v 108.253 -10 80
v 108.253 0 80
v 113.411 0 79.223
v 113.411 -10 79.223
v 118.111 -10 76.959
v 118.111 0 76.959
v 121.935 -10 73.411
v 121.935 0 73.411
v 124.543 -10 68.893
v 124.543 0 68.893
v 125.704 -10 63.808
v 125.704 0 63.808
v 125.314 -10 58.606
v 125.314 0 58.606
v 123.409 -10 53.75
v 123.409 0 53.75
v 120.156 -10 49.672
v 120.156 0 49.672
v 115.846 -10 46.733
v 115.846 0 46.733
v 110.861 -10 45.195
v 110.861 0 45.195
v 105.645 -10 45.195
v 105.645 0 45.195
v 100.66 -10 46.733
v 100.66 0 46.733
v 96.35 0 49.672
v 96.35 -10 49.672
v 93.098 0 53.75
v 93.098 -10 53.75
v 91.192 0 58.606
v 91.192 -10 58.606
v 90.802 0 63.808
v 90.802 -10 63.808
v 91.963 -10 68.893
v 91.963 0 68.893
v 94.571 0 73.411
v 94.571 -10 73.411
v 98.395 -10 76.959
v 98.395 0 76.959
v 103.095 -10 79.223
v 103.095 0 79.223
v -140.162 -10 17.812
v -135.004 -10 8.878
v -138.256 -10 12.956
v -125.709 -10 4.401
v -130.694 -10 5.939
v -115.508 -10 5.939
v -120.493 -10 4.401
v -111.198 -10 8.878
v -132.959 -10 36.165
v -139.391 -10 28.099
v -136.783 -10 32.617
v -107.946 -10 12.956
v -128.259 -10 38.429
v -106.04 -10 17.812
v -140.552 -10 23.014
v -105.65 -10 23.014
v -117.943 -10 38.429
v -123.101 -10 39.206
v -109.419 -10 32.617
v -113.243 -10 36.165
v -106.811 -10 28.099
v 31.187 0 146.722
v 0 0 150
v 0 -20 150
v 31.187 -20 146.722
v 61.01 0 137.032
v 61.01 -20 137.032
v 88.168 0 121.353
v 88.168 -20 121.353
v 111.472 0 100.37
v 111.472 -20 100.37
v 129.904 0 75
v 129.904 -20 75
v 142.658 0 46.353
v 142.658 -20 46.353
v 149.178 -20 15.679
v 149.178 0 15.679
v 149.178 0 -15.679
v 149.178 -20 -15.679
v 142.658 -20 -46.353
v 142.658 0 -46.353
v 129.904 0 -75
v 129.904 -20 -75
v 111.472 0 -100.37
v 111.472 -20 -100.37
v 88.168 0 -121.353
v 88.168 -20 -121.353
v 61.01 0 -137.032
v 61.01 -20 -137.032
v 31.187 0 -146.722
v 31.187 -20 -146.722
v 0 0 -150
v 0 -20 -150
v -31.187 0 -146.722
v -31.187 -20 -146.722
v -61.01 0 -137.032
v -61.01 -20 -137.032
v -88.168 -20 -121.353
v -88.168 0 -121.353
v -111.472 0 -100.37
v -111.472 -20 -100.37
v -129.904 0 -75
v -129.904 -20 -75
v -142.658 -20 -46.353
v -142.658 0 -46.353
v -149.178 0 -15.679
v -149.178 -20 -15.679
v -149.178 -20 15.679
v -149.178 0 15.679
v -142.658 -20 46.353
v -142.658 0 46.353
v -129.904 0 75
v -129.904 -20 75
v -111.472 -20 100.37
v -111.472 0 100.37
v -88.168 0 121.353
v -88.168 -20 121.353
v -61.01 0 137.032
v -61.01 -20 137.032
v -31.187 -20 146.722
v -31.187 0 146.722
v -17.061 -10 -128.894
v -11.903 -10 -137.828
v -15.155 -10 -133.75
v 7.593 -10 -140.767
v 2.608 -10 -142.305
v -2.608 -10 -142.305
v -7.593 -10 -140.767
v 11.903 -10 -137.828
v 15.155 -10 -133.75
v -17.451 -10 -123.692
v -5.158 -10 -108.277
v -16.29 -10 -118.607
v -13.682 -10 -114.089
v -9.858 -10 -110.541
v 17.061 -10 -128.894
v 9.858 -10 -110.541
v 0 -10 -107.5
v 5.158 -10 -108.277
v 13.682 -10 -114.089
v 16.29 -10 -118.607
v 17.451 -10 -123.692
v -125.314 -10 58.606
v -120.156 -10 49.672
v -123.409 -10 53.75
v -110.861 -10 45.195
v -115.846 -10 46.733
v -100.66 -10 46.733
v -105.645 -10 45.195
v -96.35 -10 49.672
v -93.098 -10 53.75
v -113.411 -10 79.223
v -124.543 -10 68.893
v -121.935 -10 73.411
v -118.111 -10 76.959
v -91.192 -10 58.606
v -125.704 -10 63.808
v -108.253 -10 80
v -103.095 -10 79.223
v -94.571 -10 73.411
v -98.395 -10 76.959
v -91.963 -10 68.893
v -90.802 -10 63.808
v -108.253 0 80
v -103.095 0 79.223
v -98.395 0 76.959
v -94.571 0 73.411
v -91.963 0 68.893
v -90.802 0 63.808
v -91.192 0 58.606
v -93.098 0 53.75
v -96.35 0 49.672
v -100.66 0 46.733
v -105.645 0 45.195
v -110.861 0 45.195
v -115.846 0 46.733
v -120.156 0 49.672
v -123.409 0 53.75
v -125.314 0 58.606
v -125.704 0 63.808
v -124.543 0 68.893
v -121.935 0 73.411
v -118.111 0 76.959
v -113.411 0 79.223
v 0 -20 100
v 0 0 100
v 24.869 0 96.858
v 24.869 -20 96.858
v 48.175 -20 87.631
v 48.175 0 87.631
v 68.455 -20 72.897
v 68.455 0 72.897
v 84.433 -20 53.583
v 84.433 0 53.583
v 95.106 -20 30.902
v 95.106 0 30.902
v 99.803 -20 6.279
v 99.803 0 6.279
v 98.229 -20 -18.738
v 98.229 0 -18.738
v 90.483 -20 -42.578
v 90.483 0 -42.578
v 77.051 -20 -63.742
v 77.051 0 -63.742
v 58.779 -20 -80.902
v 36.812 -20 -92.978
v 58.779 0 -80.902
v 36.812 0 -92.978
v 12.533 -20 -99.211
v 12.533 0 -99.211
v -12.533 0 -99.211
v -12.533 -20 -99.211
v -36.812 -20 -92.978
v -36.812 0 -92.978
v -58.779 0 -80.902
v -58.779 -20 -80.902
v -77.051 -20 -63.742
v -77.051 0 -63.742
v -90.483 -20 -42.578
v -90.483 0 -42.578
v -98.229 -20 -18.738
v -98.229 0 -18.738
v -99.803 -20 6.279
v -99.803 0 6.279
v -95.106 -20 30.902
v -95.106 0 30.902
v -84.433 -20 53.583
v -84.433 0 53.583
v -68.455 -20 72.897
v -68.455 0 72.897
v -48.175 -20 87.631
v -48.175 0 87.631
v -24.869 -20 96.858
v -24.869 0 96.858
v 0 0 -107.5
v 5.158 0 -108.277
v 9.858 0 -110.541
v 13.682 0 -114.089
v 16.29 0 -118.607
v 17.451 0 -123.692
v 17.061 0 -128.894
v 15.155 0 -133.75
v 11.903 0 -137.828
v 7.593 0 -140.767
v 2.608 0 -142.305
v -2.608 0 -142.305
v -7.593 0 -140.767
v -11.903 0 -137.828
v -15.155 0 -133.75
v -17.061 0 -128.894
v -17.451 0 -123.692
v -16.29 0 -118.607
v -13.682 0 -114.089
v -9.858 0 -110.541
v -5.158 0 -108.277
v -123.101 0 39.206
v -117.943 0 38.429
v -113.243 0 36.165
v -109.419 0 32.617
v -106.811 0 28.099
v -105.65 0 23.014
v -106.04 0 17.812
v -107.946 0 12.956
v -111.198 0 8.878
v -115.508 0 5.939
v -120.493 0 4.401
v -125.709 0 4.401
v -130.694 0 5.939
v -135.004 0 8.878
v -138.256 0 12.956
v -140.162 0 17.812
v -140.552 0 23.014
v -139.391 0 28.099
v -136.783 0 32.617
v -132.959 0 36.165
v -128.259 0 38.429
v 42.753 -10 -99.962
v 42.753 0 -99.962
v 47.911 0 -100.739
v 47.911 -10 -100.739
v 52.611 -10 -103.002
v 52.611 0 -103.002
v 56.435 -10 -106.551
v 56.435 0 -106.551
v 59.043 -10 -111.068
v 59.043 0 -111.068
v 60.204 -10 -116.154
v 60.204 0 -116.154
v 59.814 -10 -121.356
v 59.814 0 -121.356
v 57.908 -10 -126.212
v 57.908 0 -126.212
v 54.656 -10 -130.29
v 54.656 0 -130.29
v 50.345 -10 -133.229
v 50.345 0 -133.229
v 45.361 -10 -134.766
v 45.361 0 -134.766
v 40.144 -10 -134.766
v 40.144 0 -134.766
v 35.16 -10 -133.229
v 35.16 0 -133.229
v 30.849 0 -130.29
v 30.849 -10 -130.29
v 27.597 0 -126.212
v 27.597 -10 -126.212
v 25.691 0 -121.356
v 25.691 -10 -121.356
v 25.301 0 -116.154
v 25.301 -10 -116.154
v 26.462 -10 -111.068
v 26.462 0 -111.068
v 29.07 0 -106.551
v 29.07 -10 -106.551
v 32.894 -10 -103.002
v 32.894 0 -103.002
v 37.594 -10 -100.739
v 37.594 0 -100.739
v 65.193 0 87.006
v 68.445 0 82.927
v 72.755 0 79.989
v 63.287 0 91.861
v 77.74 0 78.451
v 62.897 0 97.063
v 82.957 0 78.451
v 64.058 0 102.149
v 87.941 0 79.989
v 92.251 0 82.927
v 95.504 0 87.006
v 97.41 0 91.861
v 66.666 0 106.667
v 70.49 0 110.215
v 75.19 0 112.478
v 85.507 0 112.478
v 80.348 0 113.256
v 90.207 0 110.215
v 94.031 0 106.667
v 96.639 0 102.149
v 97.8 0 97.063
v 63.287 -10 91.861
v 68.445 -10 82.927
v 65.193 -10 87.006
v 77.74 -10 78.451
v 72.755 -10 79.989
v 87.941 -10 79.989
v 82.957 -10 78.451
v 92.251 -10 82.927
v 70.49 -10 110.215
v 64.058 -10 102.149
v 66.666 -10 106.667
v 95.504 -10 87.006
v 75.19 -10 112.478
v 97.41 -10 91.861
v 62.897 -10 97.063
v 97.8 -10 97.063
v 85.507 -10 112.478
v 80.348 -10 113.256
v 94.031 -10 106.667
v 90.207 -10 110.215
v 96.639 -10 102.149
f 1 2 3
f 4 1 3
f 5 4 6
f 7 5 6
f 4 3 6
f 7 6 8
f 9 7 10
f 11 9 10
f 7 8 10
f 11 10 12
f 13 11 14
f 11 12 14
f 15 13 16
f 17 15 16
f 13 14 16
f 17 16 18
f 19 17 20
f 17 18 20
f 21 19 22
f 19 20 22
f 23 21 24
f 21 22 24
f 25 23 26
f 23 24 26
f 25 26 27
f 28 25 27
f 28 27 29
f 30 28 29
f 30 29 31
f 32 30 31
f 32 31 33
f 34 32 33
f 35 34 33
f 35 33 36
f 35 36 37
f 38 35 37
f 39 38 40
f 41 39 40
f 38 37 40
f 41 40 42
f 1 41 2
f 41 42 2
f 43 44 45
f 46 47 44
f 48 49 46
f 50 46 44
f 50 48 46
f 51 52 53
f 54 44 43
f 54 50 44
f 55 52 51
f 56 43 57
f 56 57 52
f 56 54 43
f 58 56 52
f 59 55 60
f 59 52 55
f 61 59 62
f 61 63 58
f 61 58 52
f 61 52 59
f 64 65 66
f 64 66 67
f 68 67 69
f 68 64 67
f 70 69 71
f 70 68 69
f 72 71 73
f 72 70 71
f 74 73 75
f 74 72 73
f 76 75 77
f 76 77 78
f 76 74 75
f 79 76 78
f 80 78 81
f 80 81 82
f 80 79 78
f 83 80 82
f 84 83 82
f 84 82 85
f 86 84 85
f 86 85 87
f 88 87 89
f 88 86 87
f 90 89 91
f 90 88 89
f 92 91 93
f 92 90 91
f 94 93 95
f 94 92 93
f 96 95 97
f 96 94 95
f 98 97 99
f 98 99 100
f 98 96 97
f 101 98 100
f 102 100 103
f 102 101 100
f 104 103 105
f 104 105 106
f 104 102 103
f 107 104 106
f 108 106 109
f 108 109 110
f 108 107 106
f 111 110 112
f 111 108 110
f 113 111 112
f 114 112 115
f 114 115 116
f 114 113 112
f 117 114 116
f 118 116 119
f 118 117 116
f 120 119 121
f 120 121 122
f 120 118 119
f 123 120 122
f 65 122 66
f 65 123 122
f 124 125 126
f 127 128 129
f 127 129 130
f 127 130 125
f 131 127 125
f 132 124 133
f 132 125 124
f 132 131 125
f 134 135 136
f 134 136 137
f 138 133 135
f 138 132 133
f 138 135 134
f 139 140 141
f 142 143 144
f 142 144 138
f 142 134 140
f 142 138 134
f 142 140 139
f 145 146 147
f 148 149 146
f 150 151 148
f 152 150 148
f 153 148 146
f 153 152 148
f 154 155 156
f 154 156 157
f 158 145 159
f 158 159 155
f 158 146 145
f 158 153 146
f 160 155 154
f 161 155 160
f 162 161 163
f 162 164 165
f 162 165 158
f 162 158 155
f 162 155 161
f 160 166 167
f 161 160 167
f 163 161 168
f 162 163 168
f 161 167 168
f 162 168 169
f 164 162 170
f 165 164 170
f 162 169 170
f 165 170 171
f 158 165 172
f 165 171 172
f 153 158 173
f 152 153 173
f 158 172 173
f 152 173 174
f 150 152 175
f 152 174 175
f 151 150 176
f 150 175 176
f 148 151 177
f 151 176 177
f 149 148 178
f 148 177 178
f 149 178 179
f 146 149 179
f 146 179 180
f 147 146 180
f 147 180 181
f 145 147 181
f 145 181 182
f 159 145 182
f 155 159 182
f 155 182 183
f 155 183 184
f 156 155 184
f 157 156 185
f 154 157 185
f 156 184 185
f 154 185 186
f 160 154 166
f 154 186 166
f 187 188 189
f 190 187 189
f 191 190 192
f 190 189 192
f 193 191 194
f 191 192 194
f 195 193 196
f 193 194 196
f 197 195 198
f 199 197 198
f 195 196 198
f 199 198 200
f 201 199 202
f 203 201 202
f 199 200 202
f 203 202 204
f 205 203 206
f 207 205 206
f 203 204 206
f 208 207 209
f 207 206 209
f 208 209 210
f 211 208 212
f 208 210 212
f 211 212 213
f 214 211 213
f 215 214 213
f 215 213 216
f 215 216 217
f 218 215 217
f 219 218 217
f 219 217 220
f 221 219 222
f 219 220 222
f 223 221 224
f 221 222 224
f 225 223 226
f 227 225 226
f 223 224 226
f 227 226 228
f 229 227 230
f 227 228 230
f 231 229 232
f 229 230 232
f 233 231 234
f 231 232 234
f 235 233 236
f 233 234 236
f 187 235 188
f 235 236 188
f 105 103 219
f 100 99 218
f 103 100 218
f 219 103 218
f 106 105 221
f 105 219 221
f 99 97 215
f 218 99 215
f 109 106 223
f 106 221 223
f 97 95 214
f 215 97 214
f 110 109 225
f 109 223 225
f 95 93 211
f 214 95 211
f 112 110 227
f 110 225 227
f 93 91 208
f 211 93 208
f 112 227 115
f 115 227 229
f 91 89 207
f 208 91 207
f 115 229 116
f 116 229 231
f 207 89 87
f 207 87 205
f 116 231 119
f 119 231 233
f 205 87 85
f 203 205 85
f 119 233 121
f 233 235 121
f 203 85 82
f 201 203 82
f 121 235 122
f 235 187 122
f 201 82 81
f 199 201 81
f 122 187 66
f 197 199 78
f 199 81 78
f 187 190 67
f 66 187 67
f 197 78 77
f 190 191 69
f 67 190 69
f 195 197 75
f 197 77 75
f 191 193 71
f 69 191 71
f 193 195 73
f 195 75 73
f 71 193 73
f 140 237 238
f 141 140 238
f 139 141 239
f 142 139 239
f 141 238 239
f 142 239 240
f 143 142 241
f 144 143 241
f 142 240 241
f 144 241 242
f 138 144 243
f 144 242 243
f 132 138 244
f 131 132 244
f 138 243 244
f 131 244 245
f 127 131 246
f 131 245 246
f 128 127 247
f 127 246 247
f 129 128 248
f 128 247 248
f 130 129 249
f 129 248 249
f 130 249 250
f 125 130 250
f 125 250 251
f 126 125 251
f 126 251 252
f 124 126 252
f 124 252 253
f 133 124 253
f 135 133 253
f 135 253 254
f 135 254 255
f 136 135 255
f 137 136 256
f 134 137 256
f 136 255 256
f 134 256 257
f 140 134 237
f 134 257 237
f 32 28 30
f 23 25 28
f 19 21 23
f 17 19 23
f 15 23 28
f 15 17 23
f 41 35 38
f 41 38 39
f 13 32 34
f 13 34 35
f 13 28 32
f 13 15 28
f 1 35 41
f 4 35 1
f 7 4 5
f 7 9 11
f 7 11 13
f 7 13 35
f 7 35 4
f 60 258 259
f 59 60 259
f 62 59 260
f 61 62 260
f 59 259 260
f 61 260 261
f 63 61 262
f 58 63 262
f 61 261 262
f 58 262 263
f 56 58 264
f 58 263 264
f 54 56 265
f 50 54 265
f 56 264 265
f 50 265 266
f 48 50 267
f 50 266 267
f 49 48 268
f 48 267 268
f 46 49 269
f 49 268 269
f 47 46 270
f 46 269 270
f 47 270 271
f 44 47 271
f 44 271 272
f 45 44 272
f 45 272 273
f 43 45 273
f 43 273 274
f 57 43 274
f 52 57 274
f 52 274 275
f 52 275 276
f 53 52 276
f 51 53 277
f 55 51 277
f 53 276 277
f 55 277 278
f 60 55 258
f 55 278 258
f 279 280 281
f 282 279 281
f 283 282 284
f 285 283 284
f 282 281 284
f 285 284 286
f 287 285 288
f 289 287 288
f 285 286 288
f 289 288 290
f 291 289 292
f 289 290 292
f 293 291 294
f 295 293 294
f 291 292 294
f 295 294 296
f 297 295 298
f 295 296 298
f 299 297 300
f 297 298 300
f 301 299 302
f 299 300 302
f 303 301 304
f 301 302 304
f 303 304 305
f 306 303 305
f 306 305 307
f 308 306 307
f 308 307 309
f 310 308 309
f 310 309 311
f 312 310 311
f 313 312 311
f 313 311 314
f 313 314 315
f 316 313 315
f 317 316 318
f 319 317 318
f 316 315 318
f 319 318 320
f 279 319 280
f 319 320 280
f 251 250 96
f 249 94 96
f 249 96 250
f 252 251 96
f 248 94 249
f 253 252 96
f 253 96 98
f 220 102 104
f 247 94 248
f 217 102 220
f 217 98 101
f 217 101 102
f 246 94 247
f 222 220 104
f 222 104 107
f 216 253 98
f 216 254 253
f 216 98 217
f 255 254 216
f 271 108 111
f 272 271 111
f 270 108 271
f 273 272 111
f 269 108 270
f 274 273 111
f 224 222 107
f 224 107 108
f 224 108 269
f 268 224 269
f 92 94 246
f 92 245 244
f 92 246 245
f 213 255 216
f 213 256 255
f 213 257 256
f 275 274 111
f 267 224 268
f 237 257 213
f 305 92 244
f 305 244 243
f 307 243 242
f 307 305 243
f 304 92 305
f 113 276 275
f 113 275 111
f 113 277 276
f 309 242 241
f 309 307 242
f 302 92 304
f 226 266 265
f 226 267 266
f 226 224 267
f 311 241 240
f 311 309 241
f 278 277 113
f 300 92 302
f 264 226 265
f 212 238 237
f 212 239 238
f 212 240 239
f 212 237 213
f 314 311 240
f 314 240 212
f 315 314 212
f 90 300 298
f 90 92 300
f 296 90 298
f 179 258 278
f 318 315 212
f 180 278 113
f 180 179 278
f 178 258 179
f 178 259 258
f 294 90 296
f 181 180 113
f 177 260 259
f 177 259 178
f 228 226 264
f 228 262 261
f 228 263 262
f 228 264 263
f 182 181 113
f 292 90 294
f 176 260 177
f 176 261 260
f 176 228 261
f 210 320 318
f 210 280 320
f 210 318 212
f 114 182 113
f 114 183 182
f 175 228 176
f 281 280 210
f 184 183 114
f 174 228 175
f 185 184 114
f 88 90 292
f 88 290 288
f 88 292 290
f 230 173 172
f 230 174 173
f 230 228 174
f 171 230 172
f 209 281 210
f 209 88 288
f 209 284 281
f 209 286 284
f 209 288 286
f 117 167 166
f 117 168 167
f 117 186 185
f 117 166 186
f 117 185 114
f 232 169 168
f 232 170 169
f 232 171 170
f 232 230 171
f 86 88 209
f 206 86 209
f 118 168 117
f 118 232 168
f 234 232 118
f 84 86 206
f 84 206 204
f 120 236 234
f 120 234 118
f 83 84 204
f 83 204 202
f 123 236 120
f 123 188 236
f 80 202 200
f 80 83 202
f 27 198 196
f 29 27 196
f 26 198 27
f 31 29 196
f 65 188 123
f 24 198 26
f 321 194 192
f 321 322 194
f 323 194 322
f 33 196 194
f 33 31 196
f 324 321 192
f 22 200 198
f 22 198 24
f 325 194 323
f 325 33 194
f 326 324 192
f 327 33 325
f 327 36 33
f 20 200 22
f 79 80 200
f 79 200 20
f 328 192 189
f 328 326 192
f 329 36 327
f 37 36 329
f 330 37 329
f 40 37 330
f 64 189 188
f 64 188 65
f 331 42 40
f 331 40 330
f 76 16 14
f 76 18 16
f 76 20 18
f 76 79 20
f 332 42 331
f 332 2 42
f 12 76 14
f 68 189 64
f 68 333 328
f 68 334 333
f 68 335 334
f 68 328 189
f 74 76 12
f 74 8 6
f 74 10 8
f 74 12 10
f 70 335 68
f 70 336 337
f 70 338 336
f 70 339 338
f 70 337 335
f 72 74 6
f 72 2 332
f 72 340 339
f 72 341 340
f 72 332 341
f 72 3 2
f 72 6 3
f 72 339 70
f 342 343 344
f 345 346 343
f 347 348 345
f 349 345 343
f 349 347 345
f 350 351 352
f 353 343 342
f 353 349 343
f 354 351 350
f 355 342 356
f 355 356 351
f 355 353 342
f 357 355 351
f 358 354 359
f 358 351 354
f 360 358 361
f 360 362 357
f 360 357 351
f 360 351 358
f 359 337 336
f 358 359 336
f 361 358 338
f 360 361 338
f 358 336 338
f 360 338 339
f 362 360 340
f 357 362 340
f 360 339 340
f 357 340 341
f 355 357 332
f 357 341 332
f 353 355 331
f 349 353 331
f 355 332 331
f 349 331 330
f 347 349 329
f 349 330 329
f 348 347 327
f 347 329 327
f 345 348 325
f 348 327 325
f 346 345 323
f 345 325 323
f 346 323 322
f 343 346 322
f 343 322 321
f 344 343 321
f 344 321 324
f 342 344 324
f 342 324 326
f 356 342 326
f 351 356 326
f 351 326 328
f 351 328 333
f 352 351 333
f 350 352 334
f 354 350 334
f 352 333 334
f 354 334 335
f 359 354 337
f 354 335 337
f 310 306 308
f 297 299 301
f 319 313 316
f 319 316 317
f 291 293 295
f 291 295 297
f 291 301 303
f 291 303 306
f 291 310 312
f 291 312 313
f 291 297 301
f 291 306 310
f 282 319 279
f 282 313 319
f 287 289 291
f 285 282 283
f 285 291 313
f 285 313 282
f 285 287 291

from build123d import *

# Parameters (mm, degrees)
SKETCH1_R          = 150
SKETCH1_R_2        = 100
EXTRUDE1_DEPTH     = 20
SKETCH2_R          = 17.5
CUT_EXTRUDE1_DEPTH = 10


with BuildPart() as part:
    # Sketch1 → Extrude1 (new body)
    with BuildSketch(Plane(origin=(0, 0, 0), x_dir=(1, 0, 0), z_dir=(0, 1, 0))):
        with Locations(Location((0, 0, 0), (0, 0, 270))):
            Circle(SKETCH1_R)
        with Locations(Location((0, 0, 0), (0, 0, 270))):
            Circle(SKETCH1_R_2, mode=Mode.SUBTRACT)
    extrude(amount=-EXTRUDE1_DEPTH)

    # Sketch2 → Cut-Extrude1 (cut)
    with BuildSketch(Plane(origin=(0, 0, 0), x_dir=(1, 0, 0), z_dir=(0, 1, 0))):
        with Locations(Location((0, 125, 0), (0, 0, 270))):
            Circle(SKETCH2_R)
        with Locations(Location((42.752517916, 117.461577598, 0), (0, 0, 270))):
            Circle(SKETCH2_R)
        with Locations(Location((108.253175473, -62.5, 0), (0, 0, 270))):
            Circle(SKETCH2_R)
        with Locations(Location((80.348451211, -95.75555539, 0), (0, 0, 270))):
            Circle(SKETCH2_R)
        with Locations(Location((-108.253175473, -62.5, 0), (0, 0, 270))):
            Circle(SKETCH2_R)
        with Locations(Location((-123.100969127, -21.706022208, 0), (0, 0, 270))):
            Circle(SKETCH2_R)
    extrude(amount=-CUT_EXTRUDE1_DEPTH, mode=Mode.SUBTRACT)


solid = part.part
